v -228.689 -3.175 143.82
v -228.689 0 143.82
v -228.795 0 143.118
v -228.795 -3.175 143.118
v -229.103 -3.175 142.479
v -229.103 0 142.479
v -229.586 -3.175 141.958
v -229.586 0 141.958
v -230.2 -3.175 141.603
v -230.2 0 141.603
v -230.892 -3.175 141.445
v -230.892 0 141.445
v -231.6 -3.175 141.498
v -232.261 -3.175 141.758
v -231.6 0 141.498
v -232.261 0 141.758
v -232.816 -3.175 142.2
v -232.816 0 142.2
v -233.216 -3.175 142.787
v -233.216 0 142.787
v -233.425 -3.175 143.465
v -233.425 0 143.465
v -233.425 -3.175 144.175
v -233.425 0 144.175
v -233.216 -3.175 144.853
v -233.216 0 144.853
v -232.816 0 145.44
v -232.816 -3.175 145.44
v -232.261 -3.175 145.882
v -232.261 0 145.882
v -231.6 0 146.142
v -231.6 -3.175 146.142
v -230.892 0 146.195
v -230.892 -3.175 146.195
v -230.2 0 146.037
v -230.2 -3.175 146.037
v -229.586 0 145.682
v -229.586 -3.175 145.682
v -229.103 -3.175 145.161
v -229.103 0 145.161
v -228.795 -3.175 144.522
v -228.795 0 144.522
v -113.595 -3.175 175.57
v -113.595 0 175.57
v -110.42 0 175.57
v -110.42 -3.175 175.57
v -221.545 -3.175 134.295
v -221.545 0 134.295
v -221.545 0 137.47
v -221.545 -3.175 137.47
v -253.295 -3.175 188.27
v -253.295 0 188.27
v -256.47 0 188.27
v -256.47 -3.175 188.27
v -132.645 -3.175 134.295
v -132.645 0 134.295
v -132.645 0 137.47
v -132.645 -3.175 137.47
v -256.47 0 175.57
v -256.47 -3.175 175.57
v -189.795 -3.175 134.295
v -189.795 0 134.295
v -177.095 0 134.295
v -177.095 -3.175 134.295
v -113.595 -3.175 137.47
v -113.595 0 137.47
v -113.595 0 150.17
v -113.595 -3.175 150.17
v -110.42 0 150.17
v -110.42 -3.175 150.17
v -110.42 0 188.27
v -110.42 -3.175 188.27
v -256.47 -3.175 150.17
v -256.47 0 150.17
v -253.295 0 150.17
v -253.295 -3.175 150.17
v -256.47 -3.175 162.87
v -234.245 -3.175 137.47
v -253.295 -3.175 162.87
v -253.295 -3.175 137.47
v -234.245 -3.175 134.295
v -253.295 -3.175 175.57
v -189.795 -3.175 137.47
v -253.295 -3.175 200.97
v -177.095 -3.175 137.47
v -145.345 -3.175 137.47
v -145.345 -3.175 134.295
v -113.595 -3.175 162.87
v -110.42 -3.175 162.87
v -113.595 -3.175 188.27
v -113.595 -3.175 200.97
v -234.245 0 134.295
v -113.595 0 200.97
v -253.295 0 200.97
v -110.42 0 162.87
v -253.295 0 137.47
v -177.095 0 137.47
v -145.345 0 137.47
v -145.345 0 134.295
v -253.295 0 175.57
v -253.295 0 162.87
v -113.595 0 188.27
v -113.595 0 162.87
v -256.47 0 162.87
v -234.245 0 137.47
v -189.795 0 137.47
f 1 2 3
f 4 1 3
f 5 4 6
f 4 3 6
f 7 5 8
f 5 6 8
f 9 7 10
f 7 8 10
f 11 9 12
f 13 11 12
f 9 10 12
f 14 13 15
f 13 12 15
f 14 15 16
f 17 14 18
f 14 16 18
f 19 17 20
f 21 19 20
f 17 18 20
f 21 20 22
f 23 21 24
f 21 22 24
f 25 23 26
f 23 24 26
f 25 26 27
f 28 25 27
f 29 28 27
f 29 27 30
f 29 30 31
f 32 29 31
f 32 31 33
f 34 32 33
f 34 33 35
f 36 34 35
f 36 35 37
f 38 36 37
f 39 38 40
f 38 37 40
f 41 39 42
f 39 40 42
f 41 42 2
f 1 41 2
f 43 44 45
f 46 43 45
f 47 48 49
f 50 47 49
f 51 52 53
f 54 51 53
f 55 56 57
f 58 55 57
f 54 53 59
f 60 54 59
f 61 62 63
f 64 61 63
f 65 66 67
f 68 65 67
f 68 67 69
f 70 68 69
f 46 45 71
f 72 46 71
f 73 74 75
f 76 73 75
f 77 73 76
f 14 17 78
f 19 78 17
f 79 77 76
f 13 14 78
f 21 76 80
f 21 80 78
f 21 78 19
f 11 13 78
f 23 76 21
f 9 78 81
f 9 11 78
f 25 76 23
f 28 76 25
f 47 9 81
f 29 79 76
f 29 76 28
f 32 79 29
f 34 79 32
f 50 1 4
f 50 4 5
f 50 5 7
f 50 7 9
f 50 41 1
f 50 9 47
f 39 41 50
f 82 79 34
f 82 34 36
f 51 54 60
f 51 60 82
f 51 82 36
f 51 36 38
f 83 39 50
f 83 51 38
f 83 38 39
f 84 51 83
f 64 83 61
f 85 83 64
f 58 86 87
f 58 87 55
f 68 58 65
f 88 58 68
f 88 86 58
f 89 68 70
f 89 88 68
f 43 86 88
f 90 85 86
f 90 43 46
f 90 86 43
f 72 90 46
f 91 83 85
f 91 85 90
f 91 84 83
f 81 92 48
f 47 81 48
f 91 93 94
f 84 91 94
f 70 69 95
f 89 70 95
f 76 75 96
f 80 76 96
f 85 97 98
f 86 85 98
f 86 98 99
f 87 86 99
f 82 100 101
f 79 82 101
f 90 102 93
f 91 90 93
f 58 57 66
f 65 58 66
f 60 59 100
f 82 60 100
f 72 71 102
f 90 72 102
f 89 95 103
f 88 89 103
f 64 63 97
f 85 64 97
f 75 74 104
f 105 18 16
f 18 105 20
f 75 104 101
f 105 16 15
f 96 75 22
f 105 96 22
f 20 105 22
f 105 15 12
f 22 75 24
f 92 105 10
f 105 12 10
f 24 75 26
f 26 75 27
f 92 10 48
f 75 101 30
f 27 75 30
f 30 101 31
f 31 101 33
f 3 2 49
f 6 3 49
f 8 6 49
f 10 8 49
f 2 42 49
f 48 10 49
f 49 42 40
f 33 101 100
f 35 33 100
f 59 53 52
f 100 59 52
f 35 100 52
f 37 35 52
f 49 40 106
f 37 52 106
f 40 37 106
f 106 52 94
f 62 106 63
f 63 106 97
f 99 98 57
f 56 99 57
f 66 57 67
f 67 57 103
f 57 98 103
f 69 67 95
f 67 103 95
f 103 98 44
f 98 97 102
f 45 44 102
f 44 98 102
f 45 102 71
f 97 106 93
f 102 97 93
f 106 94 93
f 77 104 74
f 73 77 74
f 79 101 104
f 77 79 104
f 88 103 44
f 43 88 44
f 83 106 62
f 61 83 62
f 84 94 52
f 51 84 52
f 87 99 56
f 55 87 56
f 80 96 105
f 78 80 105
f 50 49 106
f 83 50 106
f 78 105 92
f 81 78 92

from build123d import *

# Parameters (mm, degrees)
F1_DEPTH = 3.175


with BuildPart() as f1:
    # F0 (on Front) → F1 (new body)
    with BuildSketch(Plane.XZ):
        Polygon((-113.5953023911, 200.9700069427), (-253.2953023911, 200.9700069427), (-253.2953023911, 188.2700069427), (-256.4703023911, 188.2700069427), (-256.4703023911, 175.5700069427), (-253.2953023911, 175.5700069427), (-253.2953023911, 162.8700069427), (-256.4703023911, 162.8700069427), (-256.4703023911, 150.1700069427), (-253.2953023911, 150.1700069427), (-253.2953023911, 137.4700069427), (-234.2453023911, 137.4700069427), (-234.2453023911, 134.2950069427), (-221.5453023911, 134.2950069427), (-221.5453023911, 137.4700069427), (-189.7953023911, 137.4700069427), (-189.7953023911, 134.2950069427), (-177.0953023911, 134.2950069427), (-177.0953023911, 137.4700069427), (-145.3453023911, 137.4700069427), (-145.3453023911, 134.2950069427), (-132.6453023911, 134.2950069427), (-132.6453023911, 137.4700069427), (-113.5953023911, 137.4700069427), (-113.5953023911, 150.1700069427), (-110.4203023911, 150.1700069427), (-110.4203023911, 162.8700069427), (-113.5953023911, 162.8700069427), (-113.5953023911, 175.5700069427), (-110.4203023911, 175.5700069427), (-110.4203023911, 188.2700069427), (-113.5953023911, 188.2700069427), align=None)
        with BuildLine():
            ThreePointArc((-231.0703023911, 146.2012569427), (-229.3865043684, 145.5038049654), (-228.6890523911, 143.8200069427))
            ThreePointArc((-228.6890523911, 143.8200069427), (-232.7541004138, 142.13620892), (-231.0703023911, 146.2012569427))
        make_face(mode=Mode.SUBTRACT)
    extrude(amount=F1_DEPTH)


solid = f1.part
